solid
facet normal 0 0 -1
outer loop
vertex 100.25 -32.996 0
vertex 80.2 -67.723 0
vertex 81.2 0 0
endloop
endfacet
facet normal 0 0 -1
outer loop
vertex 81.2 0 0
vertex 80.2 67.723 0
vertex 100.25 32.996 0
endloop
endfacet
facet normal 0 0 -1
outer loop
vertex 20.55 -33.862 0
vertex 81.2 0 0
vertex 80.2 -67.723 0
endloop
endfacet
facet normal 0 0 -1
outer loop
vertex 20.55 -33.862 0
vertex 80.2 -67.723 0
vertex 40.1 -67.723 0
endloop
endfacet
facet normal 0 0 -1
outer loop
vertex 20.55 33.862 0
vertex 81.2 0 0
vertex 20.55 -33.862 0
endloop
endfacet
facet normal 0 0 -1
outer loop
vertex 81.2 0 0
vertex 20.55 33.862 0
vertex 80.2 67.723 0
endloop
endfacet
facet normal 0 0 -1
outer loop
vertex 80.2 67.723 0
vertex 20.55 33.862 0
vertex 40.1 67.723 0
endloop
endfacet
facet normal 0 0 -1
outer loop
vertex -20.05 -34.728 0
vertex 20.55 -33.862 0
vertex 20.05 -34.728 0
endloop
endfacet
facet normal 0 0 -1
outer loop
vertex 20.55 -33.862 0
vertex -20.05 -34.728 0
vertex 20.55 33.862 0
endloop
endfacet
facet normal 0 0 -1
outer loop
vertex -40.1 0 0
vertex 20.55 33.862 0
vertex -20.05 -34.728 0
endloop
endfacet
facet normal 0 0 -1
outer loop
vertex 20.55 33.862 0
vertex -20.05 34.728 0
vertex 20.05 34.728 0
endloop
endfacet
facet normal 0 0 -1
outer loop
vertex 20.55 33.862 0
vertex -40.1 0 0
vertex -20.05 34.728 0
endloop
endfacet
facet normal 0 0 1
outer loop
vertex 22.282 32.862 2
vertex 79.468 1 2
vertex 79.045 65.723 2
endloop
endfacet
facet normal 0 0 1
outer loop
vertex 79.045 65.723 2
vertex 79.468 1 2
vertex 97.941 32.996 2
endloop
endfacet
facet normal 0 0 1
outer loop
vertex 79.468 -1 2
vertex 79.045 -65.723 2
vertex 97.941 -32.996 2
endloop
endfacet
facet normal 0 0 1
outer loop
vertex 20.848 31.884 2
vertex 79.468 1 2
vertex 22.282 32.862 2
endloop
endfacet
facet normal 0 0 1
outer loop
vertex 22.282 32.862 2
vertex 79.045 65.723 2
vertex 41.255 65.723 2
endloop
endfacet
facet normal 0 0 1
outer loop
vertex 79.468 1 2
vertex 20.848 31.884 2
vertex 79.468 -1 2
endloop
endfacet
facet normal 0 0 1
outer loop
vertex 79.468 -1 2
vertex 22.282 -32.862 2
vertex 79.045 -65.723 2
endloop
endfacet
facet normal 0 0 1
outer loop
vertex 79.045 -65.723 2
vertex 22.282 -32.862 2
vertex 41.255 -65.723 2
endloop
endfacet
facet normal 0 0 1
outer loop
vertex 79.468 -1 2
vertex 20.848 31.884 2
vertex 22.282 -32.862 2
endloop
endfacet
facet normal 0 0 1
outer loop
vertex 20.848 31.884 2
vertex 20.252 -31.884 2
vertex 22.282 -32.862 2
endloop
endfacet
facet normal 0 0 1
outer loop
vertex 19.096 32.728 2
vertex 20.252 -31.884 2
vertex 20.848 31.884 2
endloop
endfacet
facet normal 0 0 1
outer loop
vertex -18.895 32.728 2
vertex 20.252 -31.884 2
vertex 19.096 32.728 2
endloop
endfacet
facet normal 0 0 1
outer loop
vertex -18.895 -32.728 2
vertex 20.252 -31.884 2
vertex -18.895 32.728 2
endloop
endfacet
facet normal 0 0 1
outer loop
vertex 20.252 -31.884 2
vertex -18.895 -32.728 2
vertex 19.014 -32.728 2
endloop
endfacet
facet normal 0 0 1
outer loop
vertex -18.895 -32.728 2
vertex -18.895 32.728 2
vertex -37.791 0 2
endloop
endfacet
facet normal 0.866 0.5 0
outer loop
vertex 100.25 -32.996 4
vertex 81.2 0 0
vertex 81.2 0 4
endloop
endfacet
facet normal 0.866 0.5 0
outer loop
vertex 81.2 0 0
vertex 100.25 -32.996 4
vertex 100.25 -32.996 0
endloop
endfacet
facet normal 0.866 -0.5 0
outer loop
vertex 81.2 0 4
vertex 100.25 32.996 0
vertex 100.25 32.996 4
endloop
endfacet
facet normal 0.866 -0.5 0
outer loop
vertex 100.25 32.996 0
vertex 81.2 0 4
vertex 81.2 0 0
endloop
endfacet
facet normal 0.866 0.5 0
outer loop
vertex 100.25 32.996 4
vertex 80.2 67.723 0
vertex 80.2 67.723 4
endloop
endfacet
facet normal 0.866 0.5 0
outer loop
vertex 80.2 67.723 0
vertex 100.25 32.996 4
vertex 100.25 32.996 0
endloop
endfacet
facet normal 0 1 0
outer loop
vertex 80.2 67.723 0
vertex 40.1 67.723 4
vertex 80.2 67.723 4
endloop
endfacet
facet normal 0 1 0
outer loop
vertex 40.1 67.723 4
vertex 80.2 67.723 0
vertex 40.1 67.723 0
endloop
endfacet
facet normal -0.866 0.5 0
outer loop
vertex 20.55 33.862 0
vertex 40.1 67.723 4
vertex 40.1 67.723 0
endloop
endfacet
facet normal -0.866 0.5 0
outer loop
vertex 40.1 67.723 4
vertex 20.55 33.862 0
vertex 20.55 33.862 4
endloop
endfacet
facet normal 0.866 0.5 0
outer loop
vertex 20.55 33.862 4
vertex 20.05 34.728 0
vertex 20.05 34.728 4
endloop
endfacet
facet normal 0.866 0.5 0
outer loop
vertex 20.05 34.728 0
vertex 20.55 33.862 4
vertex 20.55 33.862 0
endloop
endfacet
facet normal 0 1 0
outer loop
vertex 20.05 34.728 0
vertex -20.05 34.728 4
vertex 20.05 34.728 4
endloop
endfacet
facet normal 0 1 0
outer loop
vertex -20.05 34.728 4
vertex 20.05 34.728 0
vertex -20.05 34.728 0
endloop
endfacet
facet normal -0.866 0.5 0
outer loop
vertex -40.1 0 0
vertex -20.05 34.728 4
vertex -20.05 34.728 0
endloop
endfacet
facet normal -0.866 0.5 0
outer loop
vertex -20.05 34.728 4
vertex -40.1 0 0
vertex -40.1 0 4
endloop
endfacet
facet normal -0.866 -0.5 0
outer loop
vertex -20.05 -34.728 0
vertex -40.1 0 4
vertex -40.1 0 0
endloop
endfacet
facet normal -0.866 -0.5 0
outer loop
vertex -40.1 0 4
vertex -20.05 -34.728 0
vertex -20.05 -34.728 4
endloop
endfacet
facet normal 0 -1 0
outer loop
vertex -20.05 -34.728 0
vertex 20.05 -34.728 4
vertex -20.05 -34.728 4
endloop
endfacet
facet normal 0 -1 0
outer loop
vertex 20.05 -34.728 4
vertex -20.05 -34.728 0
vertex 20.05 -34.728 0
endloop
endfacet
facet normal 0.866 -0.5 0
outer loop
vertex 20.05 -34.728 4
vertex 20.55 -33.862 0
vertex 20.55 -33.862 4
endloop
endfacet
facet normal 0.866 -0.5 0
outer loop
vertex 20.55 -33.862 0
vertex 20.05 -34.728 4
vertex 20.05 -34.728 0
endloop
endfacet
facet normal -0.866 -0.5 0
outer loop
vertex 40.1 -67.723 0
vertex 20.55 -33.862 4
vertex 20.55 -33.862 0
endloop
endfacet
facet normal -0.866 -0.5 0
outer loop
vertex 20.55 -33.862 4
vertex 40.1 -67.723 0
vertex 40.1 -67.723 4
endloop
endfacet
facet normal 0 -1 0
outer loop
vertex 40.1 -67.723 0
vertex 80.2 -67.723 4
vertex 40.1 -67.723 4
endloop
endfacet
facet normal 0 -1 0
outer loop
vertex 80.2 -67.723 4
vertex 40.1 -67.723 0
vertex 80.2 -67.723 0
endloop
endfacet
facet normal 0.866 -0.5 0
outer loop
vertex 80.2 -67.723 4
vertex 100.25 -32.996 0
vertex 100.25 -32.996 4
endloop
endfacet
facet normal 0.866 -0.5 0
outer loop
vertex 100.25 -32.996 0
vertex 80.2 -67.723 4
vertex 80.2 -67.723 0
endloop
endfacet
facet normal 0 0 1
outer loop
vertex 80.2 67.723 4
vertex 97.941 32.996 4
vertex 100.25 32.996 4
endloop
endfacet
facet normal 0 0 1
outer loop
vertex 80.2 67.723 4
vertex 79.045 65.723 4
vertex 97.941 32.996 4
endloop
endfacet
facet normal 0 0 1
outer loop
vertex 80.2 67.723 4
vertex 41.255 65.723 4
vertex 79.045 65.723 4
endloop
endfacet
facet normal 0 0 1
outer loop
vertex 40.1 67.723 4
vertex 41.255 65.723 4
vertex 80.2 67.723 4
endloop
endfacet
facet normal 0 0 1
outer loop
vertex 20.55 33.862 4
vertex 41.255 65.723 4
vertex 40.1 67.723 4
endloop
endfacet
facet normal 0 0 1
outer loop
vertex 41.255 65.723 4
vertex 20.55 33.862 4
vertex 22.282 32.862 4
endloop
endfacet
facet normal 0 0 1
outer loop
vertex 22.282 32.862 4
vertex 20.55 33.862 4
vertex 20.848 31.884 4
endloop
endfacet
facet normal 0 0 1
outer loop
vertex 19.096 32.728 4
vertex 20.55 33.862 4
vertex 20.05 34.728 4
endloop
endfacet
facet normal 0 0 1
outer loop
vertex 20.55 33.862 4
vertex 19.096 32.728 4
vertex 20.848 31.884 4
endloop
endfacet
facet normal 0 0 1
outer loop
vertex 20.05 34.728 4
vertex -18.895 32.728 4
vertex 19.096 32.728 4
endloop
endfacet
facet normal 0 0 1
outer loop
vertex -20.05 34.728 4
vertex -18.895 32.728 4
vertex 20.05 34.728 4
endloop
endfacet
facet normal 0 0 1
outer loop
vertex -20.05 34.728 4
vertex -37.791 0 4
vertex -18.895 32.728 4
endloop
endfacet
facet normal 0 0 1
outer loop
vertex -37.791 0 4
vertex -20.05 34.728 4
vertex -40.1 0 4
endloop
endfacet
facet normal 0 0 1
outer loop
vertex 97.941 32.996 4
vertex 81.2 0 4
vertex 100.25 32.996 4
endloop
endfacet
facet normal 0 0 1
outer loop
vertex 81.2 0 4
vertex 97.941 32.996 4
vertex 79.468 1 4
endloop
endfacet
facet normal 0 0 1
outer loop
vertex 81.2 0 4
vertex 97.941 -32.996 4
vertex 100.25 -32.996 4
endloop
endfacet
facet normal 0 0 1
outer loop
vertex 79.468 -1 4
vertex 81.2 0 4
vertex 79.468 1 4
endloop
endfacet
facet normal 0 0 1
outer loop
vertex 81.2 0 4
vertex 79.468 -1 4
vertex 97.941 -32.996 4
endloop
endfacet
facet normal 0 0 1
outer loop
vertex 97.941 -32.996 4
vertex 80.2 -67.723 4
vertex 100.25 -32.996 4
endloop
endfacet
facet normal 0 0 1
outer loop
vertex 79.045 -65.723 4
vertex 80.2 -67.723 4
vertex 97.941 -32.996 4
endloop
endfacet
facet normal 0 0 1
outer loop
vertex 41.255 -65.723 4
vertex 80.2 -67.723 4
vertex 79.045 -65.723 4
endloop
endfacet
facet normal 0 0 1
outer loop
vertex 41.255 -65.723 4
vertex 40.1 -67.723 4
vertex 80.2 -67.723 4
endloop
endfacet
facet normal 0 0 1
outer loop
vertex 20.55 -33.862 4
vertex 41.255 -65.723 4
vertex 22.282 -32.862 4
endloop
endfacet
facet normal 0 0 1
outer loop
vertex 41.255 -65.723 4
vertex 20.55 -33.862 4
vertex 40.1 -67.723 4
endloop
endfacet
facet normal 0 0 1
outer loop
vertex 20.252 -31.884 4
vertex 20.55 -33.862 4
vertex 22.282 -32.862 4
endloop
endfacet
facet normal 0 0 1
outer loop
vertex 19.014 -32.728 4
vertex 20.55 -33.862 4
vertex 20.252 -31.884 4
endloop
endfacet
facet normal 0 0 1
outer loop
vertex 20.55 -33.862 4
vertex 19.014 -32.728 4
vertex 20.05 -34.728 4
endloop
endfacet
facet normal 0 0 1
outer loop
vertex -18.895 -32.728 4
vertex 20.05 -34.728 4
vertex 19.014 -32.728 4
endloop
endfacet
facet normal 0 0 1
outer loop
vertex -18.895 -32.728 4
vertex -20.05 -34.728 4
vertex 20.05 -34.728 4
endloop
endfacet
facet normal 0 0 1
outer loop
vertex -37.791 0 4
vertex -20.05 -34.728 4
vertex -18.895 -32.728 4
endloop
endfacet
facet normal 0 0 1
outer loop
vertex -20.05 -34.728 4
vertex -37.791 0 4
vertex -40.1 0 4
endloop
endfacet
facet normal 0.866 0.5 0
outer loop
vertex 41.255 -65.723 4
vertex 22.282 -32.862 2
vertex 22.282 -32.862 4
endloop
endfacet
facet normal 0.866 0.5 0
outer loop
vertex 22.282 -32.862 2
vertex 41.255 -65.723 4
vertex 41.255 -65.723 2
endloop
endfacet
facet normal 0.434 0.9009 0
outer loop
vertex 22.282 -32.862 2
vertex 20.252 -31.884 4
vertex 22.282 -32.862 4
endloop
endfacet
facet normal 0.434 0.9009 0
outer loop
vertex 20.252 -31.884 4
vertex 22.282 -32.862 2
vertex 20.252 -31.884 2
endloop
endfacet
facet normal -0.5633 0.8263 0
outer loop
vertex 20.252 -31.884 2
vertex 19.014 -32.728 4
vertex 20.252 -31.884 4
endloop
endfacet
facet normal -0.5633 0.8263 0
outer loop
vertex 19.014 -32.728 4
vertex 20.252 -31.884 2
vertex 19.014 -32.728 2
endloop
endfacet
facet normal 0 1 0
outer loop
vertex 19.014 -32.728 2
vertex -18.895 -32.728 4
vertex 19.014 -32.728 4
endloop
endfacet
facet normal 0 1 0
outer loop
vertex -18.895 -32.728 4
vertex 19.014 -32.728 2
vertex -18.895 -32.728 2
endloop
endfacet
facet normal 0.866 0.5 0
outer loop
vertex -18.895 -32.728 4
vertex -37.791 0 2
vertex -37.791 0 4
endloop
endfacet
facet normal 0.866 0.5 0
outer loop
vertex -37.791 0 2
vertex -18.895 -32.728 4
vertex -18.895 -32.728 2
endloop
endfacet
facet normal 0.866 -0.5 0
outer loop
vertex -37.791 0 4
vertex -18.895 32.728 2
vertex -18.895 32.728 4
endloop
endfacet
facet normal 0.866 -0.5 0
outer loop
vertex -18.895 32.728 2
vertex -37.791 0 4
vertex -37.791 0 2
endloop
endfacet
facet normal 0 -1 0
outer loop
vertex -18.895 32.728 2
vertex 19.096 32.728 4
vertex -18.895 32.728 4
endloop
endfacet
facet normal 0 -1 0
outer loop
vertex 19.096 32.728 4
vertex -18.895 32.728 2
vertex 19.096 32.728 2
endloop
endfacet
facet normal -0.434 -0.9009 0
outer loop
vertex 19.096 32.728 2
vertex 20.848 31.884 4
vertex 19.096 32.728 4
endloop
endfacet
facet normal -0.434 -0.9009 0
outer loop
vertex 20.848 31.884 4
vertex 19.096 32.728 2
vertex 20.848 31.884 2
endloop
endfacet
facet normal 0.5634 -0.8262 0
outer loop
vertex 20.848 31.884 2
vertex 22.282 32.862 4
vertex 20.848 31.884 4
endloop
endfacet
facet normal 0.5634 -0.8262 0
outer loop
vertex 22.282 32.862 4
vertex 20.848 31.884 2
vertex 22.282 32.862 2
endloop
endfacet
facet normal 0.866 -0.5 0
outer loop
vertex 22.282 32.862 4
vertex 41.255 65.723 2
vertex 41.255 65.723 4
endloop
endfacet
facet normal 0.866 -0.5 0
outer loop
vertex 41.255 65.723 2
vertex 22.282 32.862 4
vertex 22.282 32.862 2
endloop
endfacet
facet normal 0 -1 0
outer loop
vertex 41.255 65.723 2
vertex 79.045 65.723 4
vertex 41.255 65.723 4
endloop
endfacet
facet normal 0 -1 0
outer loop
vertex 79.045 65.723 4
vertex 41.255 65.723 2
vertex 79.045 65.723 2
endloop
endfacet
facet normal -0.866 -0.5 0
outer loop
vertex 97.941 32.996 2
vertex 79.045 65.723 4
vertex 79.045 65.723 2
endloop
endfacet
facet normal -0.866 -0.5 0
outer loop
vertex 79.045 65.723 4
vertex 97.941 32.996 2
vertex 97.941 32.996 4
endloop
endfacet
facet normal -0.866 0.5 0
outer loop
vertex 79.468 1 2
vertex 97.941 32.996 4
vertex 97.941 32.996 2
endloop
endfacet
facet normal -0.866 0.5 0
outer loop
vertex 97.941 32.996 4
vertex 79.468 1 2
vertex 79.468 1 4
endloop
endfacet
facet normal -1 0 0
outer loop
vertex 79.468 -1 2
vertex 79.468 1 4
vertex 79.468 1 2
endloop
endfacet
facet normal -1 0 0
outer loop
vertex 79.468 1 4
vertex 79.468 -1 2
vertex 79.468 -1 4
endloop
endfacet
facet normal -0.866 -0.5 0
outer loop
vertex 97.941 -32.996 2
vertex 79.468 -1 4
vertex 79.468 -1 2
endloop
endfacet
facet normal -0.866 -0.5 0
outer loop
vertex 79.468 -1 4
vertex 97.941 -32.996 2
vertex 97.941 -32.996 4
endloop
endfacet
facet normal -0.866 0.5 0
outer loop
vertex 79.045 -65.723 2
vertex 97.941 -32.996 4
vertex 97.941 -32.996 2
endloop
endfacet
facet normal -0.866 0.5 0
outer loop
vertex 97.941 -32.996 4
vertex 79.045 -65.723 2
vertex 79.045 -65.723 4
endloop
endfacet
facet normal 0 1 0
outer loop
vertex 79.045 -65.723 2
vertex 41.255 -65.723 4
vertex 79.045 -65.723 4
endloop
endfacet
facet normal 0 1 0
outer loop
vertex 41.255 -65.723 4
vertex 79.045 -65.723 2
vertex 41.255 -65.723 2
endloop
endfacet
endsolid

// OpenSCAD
inch = 25.4;
hex_h = 2;
border_height = 2;
border_thickness = 2;
hex_r = 1.5 * inch;

module hexagons() {
    radius = hex_r + border_thickness;
    union() {
        circle(r = radius, $fn = 6);
        translate([(radius * 1.5), (cos(30) * hex_r), 0]) {
            circle(r = radius, $fn = 6);
        }
        translate([(radius * 1.5), (-cos(30) * hex_r), 0]) {
            circle(r = radius, $fn = 6);
        }
    }
}

// the object itself
linear_extrude(hex_h) {
   hexagons();
}

linear_extrude(hex_h + border_height) {
    difference() {
        // outer boundary
        hexagons();
        // remove an inset copy
        offset(-border_thickness) {
            hexagons(); 
        }
    }
}
